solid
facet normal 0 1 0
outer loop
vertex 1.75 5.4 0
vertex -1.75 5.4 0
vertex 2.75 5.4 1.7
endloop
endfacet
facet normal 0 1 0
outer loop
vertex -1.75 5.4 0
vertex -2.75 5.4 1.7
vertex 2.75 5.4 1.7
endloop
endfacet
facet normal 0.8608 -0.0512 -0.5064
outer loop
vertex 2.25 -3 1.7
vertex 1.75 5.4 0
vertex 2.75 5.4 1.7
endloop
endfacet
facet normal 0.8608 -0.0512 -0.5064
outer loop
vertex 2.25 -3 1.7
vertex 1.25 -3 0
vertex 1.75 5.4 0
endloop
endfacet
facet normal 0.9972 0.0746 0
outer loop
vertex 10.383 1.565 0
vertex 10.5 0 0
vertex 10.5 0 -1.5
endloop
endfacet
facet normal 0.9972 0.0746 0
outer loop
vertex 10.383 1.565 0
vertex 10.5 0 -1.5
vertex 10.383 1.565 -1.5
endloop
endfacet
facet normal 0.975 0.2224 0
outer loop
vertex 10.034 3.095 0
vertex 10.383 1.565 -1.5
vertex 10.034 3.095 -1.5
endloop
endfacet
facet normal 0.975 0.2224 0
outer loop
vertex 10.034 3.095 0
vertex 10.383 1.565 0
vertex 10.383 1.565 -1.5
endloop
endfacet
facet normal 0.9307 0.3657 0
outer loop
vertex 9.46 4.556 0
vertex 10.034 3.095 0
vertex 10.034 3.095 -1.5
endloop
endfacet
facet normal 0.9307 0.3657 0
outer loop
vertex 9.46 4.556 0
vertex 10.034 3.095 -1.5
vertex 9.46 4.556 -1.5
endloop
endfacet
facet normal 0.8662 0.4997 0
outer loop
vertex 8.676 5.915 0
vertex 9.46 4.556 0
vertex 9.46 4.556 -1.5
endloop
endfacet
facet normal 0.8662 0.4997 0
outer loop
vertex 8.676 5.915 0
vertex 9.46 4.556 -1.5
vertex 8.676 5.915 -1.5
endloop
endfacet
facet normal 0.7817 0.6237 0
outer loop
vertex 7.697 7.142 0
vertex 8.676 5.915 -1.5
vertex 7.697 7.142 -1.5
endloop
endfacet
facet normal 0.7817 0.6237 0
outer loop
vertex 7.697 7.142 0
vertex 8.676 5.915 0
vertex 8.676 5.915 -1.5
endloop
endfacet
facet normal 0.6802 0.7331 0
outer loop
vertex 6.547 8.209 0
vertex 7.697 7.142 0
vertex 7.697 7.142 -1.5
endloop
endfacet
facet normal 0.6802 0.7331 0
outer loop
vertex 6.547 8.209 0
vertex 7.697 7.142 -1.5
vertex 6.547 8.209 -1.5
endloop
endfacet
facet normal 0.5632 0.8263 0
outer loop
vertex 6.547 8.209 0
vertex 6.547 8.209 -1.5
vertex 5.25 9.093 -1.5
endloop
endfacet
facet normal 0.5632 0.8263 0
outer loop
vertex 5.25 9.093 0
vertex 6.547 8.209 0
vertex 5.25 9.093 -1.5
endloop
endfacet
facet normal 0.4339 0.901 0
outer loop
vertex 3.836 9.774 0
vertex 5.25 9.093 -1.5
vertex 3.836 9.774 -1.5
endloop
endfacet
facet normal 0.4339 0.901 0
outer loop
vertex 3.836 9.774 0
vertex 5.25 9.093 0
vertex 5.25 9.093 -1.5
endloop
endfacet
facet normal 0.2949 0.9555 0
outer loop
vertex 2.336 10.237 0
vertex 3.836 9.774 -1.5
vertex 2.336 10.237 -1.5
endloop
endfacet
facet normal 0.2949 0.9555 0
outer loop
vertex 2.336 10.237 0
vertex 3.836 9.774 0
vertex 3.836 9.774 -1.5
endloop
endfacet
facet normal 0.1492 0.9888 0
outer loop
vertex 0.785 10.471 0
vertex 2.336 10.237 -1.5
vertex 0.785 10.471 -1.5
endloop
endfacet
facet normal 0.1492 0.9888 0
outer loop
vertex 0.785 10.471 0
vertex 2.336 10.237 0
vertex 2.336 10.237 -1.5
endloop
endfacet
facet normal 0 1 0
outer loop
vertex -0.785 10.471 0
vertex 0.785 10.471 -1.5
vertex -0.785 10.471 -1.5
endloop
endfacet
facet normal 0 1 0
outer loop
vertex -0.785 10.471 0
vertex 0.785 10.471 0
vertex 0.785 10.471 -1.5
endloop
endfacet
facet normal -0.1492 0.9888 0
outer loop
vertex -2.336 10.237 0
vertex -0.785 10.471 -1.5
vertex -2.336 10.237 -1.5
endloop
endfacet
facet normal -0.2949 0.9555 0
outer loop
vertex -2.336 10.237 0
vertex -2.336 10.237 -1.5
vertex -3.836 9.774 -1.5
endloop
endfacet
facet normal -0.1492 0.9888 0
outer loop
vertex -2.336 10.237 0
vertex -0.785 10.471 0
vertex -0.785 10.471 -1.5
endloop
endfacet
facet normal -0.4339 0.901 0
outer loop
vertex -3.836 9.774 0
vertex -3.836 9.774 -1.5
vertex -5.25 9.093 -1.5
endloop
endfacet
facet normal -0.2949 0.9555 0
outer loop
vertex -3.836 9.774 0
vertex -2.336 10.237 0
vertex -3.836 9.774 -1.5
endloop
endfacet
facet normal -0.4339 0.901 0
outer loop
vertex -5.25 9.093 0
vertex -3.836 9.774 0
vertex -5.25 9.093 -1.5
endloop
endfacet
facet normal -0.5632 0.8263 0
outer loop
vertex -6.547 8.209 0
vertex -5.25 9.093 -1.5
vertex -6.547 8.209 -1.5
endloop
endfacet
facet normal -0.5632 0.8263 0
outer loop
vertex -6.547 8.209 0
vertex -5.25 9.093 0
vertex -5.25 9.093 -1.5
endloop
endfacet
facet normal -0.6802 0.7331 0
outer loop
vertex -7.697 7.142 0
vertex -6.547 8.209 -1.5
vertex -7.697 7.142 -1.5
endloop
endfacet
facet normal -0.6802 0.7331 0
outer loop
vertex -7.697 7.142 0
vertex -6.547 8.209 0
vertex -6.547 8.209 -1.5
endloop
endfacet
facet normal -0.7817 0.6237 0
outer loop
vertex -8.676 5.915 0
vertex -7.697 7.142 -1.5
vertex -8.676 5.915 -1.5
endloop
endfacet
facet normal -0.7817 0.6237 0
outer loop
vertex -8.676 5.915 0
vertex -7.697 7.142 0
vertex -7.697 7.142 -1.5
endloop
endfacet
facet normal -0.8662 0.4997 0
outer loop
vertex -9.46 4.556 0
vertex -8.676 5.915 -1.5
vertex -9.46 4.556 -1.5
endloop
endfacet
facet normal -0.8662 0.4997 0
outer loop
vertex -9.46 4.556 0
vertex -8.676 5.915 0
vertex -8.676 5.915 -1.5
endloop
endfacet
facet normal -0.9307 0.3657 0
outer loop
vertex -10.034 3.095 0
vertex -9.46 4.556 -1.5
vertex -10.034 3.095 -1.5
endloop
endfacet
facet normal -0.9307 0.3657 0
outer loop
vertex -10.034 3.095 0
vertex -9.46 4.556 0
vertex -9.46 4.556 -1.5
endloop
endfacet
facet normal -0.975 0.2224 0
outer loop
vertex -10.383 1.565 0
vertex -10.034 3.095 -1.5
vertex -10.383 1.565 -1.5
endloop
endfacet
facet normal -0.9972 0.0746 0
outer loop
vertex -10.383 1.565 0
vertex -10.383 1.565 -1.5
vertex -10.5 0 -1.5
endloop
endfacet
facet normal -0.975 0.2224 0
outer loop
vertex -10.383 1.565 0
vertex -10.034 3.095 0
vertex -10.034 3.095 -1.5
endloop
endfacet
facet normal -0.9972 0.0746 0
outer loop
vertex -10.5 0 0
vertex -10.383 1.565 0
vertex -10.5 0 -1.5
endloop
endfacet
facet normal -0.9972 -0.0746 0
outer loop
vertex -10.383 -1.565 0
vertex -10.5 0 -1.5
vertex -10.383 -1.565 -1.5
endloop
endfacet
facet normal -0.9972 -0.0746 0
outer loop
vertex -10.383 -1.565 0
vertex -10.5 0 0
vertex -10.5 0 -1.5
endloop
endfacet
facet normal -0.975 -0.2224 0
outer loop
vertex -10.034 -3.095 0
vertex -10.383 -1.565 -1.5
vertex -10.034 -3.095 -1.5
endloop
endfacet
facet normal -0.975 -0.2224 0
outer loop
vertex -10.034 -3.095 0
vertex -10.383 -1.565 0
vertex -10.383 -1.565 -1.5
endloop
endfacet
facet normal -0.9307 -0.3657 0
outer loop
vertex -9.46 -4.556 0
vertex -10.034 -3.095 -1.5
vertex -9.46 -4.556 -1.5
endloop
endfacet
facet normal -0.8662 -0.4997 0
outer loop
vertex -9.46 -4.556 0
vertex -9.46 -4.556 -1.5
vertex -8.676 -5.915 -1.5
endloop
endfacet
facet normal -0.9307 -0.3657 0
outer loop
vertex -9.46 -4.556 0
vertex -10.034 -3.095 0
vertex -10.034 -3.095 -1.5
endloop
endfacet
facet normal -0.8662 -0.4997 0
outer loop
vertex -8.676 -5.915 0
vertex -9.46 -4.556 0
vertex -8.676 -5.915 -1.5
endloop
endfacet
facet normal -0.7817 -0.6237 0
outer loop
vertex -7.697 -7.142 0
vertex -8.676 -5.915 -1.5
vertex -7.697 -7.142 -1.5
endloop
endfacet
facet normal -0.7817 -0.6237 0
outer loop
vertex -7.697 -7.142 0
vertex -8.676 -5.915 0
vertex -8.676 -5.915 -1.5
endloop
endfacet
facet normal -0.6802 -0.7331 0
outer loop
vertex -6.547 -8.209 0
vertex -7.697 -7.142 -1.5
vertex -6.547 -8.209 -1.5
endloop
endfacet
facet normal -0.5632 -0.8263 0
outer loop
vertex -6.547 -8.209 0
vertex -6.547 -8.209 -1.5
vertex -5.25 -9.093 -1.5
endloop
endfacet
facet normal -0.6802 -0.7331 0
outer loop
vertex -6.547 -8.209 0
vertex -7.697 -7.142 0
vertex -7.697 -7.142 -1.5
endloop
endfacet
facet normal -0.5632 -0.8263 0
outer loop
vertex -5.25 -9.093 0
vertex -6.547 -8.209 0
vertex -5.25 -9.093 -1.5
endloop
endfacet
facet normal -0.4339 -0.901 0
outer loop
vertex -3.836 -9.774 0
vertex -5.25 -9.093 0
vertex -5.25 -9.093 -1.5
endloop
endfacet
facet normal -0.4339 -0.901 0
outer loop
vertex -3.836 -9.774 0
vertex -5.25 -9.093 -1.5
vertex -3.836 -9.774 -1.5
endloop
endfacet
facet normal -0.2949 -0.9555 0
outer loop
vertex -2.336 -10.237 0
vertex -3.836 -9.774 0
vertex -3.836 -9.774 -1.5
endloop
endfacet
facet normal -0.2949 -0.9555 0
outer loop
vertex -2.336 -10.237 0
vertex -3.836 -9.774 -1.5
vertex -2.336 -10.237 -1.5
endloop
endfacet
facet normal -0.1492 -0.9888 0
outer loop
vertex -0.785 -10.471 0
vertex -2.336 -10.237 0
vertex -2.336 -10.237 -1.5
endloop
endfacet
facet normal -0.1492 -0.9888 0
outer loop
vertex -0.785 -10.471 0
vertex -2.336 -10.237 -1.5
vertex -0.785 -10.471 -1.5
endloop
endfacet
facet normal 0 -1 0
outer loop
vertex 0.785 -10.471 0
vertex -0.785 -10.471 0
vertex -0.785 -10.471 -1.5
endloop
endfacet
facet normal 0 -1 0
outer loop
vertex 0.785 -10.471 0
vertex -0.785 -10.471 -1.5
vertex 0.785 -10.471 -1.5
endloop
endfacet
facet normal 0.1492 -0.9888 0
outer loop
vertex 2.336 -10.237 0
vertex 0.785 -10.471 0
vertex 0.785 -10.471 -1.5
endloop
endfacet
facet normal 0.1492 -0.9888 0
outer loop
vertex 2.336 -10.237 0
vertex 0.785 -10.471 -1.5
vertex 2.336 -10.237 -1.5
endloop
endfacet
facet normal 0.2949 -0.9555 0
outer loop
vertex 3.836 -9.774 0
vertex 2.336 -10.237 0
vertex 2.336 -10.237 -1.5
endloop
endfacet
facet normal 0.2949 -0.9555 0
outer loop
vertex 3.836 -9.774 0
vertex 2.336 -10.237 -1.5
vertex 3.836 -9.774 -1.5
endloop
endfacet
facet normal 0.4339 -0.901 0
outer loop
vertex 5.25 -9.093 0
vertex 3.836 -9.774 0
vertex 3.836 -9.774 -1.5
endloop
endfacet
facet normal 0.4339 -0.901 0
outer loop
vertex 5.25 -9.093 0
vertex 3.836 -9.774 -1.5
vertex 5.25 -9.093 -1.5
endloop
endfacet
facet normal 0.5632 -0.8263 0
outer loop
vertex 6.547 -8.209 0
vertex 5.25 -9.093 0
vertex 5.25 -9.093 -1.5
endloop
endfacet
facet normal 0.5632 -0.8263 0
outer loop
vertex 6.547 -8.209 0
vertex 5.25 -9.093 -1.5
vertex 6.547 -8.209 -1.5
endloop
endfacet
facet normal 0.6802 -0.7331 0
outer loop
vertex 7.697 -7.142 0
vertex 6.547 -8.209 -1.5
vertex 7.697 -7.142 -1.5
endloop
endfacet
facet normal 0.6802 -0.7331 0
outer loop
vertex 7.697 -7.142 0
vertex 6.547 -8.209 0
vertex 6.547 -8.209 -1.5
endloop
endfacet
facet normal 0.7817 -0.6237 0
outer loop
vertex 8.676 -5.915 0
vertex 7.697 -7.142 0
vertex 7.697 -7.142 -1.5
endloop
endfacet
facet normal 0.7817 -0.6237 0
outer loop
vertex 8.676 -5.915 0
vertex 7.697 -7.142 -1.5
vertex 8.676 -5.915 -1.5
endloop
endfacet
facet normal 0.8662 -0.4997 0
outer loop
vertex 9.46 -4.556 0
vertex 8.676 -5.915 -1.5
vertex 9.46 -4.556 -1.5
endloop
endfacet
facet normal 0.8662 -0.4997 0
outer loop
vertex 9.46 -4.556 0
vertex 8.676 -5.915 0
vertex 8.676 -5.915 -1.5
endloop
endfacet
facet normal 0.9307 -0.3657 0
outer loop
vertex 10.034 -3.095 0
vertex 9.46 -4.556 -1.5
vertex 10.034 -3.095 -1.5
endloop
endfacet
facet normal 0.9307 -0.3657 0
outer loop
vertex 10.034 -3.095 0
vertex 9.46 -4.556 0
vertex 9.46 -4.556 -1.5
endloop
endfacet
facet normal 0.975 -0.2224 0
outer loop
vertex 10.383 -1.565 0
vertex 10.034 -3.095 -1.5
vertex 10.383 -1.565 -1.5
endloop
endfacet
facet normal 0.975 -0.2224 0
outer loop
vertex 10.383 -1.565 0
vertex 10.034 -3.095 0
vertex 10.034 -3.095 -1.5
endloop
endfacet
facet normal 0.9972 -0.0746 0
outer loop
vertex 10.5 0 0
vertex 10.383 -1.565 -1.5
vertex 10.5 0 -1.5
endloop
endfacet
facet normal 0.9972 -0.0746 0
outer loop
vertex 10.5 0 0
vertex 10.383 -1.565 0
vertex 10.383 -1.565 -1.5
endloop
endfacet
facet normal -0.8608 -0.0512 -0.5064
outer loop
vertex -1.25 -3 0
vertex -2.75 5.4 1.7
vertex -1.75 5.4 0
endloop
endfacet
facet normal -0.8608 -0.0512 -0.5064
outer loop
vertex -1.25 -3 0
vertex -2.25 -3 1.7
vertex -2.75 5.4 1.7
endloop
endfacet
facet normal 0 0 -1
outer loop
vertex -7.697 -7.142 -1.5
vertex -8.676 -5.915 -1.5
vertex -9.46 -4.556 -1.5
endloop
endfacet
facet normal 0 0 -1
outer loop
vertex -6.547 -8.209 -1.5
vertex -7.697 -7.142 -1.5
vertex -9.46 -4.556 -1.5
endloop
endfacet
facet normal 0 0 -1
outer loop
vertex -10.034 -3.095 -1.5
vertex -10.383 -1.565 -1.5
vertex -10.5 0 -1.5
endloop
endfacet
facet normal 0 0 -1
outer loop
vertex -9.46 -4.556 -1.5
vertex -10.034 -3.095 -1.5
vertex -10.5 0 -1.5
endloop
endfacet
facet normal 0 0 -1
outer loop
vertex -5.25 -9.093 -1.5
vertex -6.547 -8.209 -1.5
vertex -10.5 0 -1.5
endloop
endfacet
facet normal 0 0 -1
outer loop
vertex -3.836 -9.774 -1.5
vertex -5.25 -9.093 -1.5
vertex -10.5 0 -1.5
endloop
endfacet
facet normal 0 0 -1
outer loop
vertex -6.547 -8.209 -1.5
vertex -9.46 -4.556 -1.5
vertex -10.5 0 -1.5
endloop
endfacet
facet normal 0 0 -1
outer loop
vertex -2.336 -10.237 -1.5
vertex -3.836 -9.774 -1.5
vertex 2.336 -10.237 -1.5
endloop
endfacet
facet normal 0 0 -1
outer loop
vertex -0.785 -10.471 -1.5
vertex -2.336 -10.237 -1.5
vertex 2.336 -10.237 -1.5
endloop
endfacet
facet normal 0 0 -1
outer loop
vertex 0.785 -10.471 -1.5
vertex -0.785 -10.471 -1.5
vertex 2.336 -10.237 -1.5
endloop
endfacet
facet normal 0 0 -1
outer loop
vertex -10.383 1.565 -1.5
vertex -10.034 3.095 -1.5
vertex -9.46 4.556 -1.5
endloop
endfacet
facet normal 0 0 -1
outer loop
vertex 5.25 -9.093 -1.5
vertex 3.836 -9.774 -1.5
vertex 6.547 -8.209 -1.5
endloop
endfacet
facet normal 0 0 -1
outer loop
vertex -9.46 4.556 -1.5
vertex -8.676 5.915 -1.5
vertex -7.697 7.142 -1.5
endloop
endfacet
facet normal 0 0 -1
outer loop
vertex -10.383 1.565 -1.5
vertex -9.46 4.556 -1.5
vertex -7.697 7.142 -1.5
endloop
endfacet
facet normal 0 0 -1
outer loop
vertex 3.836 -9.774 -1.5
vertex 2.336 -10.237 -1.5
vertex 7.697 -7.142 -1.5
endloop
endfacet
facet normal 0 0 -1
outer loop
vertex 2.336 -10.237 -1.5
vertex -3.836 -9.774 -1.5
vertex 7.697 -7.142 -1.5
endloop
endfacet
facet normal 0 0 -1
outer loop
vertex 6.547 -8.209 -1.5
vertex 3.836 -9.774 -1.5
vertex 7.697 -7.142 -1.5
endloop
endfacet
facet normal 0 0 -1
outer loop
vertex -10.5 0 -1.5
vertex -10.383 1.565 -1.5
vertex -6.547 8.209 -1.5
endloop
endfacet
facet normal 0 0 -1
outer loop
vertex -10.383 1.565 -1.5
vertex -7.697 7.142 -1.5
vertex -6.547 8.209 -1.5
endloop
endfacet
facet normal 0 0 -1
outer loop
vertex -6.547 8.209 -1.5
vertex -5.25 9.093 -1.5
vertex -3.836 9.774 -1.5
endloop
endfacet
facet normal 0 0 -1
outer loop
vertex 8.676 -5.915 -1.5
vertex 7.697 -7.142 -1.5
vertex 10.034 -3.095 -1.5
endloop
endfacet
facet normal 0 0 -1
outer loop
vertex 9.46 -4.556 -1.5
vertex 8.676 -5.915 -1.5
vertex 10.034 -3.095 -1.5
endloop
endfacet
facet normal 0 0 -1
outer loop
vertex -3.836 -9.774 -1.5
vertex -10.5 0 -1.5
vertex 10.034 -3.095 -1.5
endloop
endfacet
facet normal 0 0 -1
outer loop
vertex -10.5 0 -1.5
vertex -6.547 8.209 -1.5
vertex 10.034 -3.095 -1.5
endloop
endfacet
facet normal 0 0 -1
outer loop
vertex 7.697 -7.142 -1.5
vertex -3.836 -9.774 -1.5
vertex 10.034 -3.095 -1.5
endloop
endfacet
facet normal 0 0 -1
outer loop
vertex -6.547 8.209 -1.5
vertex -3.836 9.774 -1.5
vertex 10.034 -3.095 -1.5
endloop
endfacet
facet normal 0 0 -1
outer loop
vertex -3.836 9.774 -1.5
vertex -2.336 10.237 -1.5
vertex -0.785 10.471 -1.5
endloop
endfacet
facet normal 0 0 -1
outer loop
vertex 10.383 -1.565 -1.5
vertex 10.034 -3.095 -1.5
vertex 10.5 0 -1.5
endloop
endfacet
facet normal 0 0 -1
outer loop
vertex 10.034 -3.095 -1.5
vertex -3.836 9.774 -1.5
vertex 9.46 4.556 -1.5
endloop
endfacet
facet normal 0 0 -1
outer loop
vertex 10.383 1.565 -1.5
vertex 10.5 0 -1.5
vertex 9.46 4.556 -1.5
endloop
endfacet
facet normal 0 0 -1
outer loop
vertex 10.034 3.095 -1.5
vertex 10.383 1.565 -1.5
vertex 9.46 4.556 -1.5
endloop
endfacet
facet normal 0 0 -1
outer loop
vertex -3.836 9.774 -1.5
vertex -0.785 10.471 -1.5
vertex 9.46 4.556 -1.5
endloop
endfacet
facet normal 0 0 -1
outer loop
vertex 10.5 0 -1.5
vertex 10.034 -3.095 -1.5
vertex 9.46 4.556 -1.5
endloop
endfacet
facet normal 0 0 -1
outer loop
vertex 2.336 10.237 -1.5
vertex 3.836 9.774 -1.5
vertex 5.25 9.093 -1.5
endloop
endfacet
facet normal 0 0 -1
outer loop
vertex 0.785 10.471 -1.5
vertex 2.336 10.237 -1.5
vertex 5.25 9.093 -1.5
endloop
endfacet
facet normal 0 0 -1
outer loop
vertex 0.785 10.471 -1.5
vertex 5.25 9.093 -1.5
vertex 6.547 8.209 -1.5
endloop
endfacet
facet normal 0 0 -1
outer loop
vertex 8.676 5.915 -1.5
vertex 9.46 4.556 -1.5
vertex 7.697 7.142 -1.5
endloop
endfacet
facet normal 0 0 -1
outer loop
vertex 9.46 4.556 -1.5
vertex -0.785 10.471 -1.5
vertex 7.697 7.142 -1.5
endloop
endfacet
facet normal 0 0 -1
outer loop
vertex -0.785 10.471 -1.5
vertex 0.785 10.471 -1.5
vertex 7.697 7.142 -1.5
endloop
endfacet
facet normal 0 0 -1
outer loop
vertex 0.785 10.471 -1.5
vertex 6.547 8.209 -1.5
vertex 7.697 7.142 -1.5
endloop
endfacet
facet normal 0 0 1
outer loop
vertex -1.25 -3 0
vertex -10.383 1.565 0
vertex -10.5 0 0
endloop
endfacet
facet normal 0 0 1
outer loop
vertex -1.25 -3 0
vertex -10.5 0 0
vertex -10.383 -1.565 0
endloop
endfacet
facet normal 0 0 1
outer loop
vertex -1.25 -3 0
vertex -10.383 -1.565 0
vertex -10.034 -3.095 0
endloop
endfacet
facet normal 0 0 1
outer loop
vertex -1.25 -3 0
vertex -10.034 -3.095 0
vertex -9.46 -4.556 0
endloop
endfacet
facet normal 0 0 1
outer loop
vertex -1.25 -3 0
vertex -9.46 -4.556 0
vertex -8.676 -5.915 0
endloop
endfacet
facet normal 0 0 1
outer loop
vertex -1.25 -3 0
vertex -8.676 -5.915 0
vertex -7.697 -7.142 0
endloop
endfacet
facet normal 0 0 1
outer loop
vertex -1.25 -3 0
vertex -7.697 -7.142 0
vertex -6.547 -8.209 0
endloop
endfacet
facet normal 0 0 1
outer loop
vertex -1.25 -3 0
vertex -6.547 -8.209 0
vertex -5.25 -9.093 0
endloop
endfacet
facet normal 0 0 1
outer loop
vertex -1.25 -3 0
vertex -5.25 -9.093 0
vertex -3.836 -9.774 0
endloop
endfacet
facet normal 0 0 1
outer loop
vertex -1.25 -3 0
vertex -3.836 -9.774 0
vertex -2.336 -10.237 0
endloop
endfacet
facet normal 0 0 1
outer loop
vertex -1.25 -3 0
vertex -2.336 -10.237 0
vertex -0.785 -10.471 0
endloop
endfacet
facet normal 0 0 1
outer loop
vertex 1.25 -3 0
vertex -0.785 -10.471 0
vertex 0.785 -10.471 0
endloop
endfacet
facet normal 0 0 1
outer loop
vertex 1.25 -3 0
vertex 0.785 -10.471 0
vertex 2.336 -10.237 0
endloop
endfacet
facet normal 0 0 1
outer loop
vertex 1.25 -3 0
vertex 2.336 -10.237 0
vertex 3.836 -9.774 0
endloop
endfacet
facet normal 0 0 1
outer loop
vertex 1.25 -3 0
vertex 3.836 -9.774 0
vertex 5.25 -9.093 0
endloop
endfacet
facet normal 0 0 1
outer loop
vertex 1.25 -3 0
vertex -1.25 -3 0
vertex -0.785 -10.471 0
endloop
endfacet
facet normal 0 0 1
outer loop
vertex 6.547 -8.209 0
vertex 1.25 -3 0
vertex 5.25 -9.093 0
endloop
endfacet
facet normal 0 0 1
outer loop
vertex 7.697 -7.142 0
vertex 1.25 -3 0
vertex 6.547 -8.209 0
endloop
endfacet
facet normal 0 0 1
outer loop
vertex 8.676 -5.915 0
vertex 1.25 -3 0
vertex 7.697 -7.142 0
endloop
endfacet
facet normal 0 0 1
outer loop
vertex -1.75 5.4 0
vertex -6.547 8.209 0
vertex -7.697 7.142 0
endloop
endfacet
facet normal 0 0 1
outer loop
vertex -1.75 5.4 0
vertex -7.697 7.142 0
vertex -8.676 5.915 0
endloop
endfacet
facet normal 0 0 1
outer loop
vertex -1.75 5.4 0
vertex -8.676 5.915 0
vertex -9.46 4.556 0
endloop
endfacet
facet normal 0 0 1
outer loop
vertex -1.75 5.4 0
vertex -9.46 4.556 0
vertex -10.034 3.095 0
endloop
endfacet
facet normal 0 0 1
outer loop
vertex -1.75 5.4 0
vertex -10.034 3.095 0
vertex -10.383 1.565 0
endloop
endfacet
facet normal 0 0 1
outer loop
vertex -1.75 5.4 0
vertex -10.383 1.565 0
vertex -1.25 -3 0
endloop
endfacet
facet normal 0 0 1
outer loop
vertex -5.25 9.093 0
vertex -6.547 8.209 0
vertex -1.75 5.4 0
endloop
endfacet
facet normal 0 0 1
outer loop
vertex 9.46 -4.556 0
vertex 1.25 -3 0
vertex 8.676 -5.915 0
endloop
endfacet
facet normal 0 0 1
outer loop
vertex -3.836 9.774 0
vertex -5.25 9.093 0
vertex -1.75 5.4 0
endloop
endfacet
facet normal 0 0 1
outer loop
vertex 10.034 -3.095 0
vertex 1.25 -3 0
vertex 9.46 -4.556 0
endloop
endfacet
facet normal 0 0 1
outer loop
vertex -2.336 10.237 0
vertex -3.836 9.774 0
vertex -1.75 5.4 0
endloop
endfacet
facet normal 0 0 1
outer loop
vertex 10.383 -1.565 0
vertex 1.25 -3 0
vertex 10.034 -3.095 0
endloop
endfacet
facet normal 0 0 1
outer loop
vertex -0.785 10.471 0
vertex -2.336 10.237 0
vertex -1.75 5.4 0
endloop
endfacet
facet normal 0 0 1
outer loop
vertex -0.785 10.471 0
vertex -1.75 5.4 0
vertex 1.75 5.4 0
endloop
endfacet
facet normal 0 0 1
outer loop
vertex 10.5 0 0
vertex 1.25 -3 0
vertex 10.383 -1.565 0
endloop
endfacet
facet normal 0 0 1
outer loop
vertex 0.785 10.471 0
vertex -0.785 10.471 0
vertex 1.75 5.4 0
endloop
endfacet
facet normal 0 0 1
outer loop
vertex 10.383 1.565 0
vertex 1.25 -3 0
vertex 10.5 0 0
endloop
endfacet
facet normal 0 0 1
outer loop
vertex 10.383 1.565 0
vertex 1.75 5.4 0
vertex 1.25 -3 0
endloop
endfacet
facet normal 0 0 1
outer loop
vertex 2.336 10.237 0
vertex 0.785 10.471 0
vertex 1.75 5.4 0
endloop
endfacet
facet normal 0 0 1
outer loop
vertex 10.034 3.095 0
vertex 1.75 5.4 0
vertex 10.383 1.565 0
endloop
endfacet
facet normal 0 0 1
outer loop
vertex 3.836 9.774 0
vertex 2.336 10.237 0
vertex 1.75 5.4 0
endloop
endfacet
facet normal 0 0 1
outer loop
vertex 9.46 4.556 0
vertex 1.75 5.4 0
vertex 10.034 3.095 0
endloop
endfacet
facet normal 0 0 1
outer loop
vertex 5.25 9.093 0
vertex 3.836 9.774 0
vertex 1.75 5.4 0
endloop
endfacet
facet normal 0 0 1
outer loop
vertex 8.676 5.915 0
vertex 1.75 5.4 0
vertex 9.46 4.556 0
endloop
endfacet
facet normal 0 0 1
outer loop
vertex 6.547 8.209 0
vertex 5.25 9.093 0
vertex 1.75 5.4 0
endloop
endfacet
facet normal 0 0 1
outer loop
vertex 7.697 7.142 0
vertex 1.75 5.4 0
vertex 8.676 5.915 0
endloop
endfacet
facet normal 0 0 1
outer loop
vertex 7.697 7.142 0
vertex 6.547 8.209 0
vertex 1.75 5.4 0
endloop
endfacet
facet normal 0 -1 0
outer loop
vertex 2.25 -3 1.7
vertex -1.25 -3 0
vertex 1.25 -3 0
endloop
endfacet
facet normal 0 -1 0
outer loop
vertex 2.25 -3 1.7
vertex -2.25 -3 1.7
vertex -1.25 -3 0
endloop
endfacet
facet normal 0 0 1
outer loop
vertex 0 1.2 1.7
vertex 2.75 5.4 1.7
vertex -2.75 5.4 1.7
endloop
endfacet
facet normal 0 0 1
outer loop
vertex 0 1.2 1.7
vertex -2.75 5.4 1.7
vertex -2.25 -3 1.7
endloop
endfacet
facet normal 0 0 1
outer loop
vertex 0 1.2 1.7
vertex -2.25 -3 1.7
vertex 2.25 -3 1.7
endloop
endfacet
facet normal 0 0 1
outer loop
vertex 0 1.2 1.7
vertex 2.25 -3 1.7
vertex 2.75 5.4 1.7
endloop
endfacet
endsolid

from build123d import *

# Parameters (mm, degrees)
F0_R     = 10.5
F1_DEPTH = 1.5


with BuildPart() as f1:
    # F0 (on Top) → F1 (new body)
    with BuildSketch(Plane.XY):
        Circle(F0_R)
    extrude(amount=-F1_DEPTH)

    # F5 (on offset) → F6 section 0
    with BuildSketch(Plane.XZ.offset(-5.4)):
        Polygon((-1.75, 0), (1.75, 0), (2.75, 1.7), (-2.75, 1.7), align=None)
    # F3 (on offset) → F6 section 1
    with BuildSketch(Plane.XZ.offset(3)):
        Polygon((-1.25, 0), (1.25, 0), (2.25, 1.7), (-2.25, 1.7), align=None)
    loft()


solid = f1.part
